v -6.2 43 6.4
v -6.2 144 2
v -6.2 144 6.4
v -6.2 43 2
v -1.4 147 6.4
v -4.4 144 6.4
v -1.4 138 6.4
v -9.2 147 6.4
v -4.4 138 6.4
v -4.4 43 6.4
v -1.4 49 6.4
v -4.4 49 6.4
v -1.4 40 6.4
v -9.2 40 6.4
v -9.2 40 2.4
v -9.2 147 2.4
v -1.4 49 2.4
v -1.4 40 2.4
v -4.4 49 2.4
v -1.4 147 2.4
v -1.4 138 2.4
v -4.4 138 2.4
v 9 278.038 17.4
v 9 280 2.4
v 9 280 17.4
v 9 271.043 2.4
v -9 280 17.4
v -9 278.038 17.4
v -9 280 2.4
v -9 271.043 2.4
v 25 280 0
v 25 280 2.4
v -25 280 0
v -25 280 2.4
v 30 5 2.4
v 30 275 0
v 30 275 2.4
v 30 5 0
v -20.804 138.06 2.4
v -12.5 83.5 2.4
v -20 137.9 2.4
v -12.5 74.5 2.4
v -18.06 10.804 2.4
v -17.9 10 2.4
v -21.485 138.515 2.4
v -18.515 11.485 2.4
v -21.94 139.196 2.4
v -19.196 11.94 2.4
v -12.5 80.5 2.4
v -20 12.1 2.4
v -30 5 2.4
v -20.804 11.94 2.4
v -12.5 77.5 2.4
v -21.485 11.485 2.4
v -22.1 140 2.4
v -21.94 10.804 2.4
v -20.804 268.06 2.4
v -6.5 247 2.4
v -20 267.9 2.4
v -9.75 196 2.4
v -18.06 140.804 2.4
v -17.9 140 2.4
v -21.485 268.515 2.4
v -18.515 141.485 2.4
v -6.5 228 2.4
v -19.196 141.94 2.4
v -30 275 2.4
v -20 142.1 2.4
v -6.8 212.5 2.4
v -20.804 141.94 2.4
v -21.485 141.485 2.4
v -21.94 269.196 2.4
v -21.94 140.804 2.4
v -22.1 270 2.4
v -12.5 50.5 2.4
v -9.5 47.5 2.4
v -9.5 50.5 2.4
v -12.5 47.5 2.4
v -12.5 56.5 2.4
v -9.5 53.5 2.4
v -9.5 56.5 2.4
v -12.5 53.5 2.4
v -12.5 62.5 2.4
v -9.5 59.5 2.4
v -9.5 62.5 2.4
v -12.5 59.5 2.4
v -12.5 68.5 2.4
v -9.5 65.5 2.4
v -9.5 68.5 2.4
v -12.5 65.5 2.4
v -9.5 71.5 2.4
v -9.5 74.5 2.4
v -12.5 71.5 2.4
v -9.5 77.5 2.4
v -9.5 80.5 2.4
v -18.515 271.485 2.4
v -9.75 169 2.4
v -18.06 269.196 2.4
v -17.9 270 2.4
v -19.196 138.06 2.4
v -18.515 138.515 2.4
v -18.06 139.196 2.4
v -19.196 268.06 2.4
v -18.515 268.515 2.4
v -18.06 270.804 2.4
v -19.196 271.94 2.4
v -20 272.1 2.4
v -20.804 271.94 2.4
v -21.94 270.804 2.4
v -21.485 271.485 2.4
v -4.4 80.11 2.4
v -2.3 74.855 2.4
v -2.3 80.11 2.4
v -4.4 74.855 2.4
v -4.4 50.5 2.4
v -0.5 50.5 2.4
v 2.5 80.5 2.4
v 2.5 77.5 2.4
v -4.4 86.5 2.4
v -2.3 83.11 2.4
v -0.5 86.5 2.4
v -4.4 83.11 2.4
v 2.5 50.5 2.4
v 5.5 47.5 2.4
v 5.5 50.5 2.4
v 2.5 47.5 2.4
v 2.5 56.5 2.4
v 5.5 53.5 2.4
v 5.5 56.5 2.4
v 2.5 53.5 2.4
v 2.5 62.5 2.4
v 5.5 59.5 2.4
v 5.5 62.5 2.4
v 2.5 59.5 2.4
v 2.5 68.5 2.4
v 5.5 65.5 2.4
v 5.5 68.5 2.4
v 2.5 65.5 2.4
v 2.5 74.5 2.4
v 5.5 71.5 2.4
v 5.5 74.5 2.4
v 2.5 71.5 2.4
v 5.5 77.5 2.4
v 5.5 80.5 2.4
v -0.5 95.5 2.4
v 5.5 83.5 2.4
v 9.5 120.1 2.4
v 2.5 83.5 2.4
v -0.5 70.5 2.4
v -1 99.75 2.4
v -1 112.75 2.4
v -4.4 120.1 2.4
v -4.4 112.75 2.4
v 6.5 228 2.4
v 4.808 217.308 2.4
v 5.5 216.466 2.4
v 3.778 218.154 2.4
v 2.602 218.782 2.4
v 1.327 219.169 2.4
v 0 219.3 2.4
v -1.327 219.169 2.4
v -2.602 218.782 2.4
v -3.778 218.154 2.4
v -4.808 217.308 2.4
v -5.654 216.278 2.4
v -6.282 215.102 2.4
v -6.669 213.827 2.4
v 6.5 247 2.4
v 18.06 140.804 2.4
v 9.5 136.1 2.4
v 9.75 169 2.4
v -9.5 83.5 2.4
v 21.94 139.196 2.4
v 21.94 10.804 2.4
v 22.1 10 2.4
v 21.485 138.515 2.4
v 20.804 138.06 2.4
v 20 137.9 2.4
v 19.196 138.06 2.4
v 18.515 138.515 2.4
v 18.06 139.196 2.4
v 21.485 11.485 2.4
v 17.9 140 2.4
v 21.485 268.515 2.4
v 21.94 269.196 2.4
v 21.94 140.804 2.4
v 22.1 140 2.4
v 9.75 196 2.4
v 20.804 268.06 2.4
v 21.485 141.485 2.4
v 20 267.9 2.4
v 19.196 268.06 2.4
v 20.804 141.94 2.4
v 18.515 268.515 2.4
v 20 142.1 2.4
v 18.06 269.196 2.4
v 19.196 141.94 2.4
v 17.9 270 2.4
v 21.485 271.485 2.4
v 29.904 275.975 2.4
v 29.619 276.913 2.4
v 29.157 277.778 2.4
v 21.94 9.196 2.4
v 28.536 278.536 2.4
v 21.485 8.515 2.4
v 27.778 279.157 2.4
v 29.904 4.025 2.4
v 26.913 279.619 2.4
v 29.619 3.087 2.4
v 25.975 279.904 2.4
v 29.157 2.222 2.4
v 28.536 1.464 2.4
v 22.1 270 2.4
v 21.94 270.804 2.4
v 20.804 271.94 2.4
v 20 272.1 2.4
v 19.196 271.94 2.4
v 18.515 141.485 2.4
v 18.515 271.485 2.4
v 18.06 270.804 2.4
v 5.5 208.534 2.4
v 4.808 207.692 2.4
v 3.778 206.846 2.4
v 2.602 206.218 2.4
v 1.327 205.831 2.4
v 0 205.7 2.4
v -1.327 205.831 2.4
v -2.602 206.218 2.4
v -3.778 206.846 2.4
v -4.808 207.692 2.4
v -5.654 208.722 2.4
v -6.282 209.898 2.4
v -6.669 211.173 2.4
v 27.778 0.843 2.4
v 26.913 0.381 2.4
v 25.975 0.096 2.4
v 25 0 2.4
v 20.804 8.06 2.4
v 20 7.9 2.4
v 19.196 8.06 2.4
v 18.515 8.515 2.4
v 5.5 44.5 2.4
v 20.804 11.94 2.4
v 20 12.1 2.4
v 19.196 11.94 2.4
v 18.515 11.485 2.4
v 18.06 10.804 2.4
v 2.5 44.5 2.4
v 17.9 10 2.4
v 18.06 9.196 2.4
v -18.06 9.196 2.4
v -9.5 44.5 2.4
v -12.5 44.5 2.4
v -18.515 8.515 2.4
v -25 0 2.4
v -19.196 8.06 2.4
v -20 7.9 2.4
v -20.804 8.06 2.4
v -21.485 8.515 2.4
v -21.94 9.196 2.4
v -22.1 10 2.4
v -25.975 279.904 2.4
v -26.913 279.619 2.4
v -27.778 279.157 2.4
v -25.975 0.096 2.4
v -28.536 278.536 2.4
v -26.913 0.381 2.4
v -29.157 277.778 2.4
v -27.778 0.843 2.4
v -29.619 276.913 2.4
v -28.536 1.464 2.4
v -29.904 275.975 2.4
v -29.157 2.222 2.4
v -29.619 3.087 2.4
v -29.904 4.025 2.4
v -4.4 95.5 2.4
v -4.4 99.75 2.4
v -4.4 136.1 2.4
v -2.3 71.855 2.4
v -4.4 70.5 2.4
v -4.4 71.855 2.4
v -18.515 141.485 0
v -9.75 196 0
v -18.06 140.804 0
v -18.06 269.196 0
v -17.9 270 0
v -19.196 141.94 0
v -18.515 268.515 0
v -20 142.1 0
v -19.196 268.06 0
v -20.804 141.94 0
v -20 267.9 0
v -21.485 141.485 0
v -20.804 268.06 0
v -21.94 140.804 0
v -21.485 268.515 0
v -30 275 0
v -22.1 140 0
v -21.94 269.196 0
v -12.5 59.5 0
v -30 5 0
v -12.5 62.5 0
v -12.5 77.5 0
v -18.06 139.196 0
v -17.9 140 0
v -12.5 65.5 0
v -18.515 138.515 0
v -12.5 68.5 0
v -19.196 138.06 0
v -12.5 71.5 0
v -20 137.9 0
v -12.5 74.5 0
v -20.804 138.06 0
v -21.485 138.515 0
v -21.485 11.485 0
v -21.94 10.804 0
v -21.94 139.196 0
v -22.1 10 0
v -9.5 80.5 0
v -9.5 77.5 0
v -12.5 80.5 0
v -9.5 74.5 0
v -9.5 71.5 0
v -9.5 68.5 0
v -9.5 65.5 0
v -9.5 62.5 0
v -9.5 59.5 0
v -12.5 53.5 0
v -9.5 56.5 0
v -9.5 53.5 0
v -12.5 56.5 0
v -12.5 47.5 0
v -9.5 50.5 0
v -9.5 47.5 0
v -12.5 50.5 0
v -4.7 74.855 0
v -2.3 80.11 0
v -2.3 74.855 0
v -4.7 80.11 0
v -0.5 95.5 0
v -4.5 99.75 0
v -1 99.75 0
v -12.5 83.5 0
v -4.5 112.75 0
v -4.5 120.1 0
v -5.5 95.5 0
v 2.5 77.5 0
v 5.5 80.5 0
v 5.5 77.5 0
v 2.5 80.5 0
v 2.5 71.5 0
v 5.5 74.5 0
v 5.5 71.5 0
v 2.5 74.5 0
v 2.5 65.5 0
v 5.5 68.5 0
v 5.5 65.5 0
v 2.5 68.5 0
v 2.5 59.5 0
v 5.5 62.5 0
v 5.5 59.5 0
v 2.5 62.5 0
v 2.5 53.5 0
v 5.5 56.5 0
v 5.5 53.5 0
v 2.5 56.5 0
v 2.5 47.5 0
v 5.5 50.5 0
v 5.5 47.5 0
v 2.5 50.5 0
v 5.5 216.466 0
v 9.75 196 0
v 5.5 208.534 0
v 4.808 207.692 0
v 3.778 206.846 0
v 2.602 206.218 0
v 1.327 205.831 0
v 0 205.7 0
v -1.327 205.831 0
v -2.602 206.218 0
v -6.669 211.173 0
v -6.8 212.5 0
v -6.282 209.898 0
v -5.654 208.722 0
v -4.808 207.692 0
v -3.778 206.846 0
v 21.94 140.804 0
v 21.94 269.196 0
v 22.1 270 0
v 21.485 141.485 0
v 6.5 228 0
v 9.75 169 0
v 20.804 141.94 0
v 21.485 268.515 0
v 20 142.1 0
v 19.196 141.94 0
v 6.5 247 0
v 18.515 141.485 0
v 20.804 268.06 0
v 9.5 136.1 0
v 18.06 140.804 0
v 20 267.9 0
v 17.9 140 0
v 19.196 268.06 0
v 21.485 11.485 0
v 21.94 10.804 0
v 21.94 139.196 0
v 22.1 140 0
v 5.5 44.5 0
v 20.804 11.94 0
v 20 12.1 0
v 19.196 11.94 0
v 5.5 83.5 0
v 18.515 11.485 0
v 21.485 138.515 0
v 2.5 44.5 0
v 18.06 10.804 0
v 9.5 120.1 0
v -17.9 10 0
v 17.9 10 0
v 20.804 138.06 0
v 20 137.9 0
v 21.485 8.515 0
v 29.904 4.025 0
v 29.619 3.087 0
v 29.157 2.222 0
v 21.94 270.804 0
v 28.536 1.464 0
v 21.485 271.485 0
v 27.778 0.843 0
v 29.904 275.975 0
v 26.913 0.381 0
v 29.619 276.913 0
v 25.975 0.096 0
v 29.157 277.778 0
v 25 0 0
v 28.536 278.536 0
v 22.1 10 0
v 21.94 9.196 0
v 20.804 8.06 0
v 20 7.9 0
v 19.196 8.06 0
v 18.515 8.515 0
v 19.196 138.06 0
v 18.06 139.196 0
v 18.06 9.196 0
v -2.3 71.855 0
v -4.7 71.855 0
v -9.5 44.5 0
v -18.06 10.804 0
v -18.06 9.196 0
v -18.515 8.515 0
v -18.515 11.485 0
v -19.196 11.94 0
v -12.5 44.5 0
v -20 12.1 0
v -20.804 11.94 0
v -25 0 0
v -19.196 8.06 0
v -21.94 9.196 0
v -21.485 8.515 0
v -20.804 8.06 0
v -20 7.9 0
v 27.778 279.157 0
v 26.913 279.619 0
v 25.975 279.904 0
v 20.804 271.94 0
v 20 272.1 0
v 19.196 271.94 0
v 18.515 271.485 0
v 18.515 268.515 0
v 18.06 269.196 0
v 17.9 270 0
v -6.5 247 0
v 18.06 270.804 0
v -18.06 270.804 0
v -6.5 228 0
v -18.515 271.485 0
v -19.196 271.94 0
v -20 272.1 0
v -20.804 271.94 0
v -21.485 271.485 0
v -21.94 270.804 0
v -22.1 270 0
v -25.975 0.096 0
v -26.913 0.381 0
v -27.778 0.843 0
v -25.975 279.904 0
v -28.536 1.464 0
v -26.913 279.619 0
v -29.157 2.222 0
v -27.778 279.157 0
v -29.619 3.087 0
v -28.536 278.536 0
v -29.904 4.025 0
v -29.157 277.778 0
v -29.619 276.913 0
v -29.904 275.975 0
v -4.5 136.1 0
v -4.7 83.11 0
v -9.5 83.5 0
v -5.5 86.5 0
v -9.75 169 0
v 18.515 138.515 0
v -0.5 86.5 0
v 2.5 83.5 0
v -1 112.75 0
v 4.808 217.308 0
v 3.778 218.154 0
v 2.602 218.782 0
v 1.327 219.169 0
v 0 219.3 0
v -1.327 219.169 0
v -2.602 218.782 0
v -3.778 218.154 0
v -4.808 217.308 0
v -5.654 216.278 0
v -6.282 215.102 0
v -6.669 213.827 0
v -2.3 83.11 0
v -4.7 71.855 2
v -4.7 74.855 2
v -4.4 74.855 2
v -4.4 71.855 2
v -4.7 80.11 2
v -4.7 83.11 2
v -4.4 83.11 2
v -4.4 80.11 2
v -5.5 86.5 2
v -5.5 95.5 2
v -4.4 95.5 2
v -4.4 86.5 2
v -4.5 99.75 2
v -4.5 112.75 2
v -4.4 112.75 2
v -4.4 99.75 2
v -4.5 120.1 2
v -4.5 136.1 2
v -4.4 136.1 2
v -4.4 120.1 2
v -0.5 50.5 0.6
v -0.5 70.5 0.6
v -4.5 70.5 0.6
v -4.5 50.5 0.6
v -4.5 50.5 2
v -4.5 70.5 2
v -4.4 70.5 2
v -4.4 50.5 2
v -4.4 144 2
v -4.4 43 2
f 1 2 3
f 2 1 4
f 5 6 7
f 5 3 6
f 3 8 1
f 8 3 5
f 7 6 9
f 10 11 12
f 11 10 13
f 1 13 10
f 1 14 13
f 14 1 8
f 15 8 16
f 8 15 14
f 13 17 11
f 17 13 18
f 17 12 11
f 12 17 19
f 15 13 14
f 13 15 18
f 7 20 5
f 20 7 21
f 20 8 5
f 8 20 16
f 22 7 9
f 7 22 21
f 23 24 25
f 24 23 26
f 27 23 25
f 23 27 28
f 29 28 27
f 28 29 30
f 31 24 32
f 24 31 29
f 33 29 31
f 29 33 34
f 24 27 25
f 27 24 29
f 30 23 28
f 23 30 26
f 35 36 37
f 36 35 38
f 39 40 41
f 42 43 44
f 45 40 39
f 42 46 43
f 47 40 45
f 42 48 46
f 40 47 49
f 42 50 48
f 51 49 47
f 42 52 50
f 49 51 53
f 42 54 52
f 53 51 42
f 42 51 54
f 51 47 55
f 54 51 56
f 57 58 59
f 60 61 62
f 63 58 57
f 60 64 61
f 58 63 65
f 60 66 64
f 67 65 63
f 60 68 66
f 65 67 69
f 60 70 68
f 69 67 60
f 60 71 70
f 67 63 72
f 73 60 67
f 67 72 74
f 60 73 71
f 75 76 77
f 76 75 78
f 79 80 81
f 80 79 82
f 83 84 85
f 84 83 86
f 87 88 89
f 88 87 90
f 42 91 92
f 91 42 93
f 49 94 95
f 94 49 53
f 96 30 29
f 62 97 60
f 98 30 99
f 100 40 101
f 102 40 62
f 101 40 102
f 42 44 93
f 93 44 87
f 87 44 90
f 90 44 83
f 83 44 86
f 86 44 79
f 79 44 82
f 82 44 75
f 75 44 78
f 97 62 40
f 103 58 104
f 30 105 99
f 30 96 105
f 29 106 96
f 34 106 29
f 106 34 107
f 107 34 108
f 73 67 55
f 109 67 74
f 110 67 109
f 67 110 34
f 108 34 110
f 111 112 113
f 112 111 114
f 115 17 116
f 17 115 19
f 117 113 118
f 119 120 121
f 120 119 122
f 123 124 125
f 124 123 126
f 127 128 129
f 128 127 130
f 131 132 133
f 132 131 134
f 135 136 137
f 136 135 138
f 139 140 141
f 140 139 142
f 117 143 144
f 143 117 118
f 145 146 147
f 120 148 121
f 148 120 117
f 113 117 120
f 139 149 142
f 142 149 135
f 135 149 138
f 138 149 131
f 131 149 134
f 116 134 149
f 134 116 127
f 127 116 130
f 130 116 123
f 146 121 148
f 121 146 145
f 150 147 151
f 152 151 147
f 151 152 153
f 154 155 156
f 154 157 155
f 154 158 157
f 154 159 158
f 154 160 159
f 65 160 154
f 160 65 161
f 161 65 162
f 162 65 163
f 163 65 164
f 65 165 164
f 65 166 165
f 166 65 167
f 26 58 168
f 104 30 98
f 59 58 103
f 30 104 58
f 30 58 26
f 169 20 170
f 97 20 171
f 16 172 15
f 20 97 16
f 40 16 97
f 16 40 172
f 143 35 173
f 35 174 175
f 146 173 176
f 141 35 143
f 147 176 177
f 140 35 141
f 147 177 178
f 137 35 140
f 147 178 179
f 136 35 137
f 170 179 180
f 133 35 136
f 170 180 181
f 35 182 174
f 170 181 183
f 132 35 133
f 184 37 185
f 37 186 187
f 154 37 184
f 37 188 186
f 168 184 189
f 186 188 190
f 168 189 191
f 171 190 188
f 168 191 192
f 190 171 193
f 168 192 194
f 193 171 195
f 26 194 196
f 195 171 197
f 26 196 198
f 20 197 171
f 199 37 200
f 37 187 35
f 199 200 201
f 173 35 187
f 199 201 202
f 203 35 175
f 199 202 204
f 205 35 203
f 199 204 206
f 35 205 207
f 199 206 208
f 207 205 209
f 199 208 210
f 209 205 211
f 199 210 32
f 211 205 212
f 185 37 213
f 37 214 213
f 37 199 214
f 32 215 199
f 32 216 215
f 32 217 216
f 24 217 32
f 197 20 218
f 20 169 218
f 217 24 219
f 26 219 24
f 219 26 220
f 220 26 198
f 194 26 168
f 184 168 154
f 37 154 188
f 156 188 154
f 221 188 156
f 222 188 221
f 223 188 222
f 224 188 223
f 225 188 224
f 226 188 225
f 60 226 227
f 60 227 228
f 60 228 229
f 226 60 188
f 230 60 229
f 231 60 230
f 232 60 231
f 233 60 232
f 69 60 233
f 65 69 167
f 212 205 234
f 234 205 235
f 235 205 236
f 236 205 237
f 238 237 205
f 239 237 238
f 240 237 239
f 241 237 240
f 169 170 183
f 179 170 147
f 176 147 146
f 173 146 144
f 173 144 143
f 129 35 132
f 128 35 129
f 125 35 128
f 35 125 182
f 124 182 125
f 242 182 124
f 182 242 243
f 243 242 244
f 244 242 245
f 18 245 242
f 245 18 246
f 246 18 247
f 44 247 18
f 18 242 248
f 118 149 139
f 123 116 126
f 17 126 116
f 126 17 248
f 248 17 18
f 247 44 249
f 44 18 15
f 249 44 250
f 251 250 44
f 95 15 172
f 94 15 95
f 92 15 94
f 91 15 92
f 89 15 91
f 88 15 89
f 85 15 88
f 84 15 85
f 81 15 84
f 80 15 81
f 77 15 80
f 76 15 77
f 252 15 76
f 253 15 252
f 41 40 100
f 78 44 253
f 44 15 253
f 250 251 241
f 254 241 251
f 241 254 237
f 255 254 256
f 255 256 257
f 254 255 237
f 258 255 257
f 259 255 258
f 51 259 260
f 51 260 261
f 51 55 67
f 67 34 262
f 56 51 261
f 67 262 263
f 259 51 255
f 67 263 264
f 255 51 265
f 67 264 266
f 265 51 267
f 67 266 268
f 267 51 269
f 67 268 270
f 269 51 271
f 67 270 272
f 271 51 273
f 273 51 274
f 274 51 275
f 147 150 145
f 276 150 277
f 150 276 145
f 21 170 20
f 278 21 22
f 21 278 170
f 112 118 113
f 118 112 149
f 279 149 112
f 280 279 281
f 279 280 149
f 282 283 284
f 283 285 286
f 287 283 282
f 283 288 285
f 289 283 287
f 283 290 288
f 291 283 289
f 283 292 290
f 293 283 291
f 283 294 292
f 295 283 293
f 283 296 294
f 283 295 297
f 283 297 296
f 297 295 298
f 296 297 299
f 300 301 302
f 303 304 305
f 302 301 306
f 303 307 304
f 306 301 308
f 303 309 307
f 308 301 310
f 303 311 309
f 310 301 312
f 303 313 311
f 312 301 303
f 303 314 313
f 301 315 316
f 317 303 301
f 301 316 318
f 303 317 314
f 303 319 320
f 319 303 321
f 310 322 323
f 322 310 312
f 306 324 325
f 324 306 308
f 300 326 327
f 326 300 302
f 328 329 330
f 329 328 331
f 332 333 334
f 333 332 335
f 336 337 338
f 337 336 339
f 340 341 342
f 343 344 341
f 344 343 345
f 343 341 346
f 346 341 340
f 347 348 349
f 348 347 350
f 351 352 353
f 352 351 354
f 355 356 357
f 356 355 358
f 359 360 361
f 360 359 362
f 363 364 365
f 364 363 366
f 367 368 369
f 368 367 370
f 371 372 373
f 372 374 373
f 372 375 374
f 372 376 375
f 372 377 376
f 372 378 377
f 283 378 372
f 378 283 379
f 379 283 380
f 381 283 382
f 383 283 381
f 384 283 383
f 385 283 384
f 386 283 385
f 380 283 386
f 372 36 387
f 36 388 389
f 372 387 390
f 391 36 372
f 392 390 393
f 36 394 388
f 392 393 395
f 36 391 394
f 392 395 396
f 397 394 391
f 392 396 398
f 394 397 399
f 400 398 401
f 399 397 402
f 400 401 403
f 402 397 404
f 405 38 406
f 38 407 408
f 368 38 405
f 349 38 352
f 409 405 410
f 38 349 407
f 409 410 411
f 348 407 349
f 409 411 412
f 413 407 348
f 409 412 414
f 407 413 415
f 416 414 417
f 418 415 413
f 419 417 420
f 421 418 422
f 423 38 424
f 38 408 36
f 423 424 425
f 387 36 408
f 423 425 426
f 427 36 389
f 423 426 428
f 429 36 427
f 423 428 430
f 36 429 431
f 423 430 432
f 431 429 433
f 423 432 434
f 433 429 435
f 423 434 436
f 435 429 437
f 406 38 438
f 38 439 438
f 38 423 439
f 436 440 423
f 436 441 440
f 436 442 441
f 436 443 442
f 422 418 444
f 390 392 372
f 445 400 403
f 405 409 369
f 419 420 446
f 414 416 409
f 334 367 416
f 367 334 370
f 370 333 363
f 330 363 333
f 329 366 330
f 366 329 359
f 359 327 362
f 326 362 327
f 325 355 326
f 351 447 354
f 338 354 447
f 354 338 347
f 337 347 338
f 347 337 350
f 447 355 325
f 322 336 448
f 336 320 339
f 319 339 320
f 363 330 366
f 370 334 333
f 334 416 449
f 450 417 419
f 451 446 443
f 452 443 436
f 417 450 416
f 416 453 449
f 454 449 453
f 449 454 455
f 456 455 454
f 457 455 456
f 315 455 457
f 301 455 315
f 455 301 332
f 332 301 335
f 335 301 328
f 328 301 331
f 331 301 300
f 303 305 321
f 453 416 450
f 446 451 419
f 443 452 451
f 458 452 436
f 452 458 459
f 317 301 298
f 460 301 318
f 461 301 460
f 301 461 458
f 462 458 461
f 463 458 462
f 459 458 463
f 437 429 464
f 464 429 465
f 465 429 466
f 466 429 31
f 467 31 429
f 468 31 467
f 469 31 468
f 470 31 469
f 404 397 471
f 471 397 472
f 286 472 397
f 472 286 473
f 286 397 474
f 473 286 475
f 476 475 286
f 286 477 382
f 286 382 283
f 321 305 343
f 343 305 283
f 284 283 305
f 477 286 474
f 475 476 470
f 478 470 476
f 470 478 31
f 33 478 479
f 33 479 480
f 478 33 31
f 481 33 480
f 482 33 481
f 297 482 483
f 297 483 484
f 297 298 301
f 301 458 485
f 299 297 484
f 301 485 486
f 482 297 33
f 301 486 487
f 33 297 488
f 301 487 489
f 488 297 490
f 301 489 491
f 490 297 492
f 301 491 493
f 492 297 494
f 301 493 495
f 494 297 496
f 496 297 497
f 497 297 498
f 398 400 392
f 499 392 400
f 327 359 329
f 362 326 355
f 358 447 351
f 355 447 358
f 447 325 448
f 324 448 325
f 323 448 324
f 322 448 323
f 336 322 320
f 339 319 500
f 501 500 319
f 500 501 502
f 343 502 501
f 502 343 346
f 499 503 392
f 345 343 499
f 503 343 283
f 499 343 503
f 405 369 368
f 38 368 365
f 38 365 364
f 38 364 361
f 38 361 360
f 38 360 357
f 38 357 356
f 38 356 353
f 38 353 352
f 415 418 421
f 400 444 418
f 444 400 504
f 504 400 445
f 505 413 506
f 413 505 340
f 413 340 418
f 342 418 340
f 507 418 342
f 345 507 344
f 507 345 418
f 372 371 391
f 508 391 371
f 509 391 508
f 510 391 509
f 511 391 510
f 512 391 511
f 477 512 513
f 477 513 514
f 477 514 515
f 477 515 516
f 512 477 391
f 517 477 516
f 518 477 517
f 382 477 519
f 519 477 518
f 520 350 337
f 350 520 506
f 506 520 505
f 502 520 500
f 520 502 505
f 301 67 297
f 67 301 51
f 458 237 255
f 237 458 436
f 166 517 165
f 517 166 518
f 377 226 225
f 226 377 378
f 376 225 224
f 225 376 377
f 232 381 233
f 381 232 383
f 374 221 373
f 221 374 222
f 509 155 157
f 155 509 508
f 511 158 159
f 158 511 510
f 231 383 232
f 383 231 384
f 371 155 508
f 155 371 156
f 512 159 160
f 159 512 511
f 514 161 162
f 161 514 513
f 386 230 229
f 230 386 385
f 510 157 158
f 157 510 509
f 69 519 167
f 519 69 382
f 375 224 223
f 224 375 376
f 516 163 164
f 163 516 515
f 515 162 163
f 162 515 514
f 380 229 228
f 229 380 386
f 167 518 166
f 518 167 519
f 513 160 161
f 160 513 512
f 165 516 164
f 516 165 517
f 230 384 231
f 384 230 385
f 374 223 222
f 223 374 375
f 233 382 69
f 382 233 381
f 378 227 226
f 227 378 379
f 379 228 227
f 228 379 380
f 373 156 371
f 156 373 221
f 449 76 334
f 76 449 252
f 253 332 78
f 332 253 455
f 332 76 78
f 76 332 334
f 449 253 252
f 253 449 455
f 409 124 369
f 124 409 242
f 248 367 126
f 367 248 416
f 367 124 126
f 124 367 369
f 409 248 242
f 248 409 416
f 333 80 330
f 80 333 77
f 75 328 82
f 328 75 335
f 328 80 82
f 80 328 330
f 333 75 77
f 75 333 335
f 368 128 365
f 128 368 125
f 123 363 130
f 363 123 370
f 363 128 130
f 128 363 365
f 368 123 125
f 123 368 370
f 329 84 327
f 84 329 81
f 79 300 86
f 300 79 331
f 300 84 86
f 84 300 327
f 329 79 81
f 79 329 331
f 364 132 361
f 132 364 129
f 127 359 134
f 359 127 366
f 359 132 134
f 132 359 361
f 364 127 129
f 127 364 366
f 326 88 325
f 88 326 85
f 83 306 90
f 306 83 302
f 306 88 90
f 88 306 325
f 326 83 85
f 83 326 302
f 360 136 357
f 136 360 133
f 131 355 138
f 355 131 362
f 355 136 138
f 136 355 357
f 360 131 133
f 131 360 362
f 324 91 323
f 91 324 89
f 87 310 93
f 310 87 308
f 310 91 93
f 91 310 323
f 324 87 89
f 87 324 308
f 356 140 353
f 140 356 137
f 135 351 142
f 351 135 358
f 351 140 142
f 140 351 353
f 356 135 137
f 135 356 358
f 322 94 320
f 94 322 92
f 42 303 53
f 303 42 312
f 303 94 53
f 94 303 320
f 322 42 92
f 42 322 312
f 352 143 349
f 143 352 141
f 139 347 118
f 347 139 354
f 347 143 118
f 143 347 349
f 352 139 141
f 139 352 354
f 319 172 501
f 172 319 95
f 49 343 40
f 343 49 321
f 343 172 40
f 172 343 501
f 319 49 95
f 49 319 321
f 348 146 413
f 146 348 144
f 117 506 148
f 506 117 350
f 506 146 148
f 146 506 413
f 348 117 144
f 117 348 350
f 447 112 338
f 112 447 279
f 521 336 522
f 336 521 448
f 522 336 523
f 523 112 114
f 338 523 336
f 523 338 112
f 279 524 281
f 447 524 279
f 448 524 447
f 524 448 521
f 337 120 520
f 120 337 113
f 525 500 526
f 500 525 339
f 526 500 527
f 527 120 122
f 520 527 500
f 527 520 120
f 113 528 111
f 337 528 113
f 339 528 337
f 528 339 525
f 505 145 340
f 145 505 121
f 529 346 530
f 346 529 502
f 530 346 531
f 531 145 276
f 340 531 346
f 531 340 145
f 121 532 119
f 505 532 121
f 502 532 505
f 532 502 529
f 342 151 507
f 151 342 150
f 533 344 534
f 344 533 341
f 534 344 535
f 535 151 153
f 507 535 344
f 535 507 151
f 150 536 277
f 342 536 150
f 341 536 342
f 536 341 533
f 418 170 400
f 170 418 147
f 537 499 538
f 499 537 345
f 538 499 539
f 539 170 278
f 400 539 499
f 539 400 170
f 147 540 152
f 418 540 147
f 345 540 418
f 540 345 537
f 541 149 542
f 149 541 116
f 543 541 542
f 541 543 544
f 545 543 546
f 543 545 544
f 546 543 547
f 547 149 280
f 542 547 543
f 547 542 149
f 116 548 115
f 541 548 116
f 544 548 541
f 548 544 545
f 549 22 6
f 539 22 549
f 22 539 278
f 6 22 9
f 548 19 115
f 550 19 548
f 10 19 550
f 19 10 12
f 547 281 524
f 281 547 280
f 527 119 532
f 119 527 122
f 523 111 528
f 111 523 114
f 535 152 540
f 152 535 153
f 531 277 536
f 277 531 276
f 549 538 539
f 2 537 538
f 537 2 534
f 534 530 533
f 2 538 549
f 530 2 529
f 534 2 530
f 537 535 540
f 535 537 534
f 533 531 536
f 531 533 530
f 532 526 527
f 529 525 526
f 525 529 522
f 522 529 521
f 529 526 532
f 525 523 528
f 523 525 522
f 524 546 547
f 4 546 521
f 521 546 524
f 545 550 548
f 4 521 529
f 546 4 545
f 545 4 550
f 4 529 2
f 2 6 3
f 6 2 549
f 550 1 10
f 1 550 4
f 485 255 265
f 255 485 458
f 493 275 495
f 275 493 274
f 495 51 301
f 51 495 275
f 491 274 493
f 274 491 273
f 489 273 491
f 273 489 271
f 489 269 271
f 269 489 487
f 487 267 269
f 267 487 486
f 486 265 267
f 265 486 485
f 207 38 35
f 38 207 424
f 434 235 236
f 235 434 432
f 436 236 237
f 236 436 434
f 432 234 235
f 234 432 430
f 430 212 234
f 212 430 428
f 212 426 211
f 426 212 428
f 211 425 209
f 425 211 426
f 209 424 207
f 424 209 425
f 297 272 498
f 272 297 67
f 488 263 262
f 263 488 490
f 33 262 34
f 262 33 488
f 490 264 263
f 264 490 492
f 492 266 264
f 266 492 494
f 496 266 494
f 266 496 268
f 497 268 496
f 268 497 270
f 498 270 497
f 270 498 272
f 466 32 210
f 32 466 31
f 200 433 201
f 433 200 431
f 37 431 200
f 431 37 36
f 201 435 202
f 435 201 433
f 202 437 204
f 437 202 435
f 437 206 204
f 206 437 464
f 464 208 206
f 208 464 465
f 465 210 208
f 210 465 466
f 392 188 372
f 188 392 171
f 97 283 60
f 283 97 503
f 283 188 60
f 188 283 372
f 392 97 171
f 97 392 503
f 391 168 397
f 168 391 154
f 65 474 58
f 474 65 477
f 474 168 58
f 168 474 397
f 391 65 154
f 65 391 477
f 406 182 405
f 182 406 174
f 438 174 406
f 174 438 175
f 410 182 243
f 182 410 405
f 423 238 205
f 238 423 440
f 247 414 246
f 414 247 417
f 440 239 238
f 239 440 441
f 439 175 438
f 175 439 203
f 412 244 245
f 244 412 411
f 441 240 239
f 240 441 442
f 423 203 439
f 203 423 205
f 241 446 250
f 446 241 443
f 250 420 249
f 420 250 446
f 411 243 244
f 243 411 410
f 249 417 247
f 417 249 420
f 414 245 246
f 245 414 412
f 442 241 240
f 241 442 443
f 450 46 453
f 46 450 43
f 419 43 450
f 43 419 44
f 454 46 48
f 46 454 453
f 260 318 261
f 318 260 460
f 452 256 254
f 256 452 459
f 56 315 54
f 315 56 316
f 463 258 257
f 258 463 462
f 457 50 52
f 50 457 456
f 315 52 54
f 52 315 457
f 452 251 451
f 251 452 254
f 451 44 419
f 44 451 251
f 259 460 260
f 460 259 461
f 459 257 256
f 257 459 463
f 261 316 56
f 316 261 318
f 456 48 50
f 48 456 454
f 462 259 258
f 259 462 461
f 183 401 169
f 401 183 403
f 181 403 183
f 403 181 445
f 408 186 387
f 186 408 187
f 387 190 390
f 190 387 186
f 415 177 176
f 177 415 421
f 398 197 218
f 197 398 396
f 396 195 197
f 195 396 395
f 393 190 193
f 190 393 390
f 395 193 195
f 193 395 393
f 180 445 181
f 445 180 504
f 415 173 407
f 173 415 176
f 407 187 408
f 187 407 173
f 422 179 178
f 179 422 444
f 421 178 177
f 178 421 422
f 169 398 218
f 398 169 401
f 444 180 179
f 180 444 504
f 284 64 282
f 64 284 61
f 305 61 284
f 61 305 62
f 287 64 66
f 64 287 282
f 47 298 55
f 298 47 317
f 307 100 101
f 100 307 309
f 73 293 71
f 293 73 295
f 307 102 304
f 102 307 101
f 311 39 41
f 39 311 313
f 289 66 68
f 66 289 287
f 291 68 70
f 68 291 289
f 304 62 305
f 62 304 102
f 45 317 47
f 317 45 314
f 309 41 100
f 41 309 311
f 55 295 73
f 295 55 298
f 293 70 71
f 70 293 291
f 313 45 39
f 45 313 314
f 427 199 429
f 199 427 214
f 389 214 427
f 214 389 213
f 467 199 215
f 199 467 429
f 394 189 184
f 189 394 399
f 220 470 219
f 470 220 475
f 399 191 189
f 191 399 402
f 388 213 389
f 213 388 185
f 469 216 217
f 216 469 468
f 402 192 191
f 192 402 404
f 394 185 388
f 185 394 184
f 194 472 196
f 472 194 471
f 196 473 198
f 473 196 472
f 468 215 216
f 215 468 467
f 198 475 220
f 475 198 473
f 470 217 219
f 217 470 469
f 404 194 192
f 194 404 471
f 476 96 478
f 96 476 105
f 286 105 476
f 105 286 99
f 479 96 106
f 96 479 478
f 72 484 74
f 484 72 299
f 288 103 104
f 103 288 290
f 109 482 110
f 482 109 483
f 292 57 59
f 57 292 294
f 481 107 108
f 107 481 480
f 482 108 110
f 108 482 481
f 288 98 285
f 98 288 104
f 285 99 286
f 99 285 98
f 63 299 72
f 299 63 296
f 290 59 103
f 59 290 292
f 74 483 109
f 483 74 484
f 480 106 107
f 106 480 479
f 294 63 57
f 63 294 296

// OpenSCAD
// Kossel mains inlet panel and Duet mount

length=280;
height=60;
thickness=2.4;
inletOffset=220-(355-280)/2;
duetYOffset=81 - (355-length)/2;
duetTopXOffset=-10+5.5;

pbHeight=2.4;
pbWidth=3;
pbOffset=-0.2;
pbPos1=29.855;
pbPos2=38.11;
usbHeight=5;
usbWidth=9;
usbOffset=-1;
usbPos=47.5;
sdHeight= 3.5;
sdWidth=13;
sdOffset=0;
sdPos=62.75;
ethernetHeight=14;
ethernetWidth=16;
ethernetOffset=0;
ethernetPos=84.6;

ribThickness=3;
ribHeight=4;
pcbThick=1.6;
pcbClear=0.1;
pcbWidth=100;
pcbWclear=0.5;

round=5;
m4ClearRad=2.1;

overlap=0.02;

module fuseCutout() {
	translate([0,0,-overlap])
		difference() {
			cylinder(r=6.8,h=thickness+2*overlap,$fn=32);
			translate([5.5,-10,-overlap]) cube([20,20,thickness+4*overlap]);
		}
}

module switchCutout() {
	union() {
		cube([13,19,10], center=true);
	}
}

module inletCutout() {
	union() {
		cube([19.5,27,10], center=true);
	}
}

// Finger guard is aligned with right side at Y=0
module fingerGuard() {
	translate([-9,-10,0])
		difference() {
			cube([18,10,15+overlap]);
			translate([-1,-10,0]) rotate([-25,0,0]) cube([20,10,50]);
		}
}

module roundCorner(radius, height) {
	difference() {
		cube([radius+2,radius+2,height]);
		translate([0,0,-overlap]) cylinder(r=radius,h=height+2*overlap,$fn=32);
	}
}

// Duet connector cutout, referenced to the bottom corner and the top of the PCB
module duetCutouts() {
	// push buttons
	translate([pbOffset + pbHeight/2,pbPos1,-overlap]) cube([pbHeight,pbWidth,10], center=true);
	translate([pbOffset + pbHeight/2,pbPos2,-overlap]) cube([pbHeight,pbWidth,10], center=true);
	// USB connector
	translate([usbOffset + usbHeight/2,usbPos,-overlap]) cube([usbHeight,usbWidth,20], center=true);
	// SD card
	translate([sdOffset + sdHeight/2,sdPos,-overlap]) cube([sdHeight,sdWidth,10], center=true);
	// Ethernet
	translate([ethernetOffset + ethernetHeight/2,ethernetPos,-overlap])
		cube([ethernetHeight,ethernetWidth,10], center=true);
	// LEDs
	translate([0,7,0.6]) cube([4,20,10]);
	// Board
	translate([-pcbThick-pcbClear,-pcbWclear,2.0])
		cube([pcbThick+2*pcbClear,pcbWidth+2*pcbWclear, 10]);
	// Ventilation holes
	for(y=[1:6:40])
		for(x=[-8,7])
			translate([x,y,-overlap])
				cube([3,3,10]);
}

module duetRibs() {
	translate([-pcbThick-pcbClear-ribThickness,-overlap,thickness-overlap])
		cube([ribThickness,pcbWidth+pcbWclear+2*overlap,ribHeight+overlap]);

	translate([-ribThickness-pcbThick-pcbClear,-ribThickness-pcbWclear,thickness-overlap])
		cube([pcbThick+2*ribThickness+2*pcbClear,6+ribThickness,ribHeight+overlap]);
	translate([-ribThickness-pcbThick-pcbClear,pcbWidth+pcbWclear-6,thickness-overlap])
		cube([pcbThick+2*ribThickness+2*pcbClear,6+ribThickness,ribHeight+overlap]);
}

difference() {
	union() {
		translate([-height/2,0,0]) cube([height,length,thickness]);
		translate([duetTopXOffset,duetYOffset, 0]) duetRibs();
		translate([0,length,thickness-overlap]) fingerGuard();
	}
	translate([0,inletOffset,0]) inletCutout();
	translate([0,inletOffset+30,0]) fuseCutout();
	translate([0,inletOffset+55,0]) switchCutout();

	translate([duetTopXOffset,duetYOffset,0]) duetCutouts();

	// Screw holes
	translate([20,10,-overlap]) cylinder(r=m4ClearRad,h=thickness+2*overlap, $fn=16);
	translate([-20,10,-overlap]) cylinder(r=m4ClearRad,h=thickness+2*overlap, $fn=16);
	translate([20,length/2,-overlap]) cylinder(r=m4ClearRad,h=thickness+2*overlap, $fn=16);
	translate([-20,length/2,-overlap]) cylinder(r=m4ClearRad,h=thickness+2*overlap, $fn=16);
	translate([20,length-10,-overlap]) cylinder(r=m4ClearRad,h=thickness+2*overlap, $fn=16);
	translate([-20,length-10,-overlap]) cylinder(r=m4ClearRad,h=thickness+2*overlap, $fn=16);

	// Corners
	translate([-height/2+round,round,-overlap])
		rotate([0,0,180]) roundCorner(round,thickness+2*overlap);
	translate([height/2-round,round,-overlap])
		rotate([0,0,-90]) roundCorner(round,thickness+2*overlap);
	translate([-height/2+round,length-round,-overlap])
		rotate([0,0,90]) roundCorner(round,thickness+2*overlap);
	translate([height/2-round,length-round,-overlap])
		rotate([0,0,0]) roundCorner(round,thickness+2*overlap);
}
